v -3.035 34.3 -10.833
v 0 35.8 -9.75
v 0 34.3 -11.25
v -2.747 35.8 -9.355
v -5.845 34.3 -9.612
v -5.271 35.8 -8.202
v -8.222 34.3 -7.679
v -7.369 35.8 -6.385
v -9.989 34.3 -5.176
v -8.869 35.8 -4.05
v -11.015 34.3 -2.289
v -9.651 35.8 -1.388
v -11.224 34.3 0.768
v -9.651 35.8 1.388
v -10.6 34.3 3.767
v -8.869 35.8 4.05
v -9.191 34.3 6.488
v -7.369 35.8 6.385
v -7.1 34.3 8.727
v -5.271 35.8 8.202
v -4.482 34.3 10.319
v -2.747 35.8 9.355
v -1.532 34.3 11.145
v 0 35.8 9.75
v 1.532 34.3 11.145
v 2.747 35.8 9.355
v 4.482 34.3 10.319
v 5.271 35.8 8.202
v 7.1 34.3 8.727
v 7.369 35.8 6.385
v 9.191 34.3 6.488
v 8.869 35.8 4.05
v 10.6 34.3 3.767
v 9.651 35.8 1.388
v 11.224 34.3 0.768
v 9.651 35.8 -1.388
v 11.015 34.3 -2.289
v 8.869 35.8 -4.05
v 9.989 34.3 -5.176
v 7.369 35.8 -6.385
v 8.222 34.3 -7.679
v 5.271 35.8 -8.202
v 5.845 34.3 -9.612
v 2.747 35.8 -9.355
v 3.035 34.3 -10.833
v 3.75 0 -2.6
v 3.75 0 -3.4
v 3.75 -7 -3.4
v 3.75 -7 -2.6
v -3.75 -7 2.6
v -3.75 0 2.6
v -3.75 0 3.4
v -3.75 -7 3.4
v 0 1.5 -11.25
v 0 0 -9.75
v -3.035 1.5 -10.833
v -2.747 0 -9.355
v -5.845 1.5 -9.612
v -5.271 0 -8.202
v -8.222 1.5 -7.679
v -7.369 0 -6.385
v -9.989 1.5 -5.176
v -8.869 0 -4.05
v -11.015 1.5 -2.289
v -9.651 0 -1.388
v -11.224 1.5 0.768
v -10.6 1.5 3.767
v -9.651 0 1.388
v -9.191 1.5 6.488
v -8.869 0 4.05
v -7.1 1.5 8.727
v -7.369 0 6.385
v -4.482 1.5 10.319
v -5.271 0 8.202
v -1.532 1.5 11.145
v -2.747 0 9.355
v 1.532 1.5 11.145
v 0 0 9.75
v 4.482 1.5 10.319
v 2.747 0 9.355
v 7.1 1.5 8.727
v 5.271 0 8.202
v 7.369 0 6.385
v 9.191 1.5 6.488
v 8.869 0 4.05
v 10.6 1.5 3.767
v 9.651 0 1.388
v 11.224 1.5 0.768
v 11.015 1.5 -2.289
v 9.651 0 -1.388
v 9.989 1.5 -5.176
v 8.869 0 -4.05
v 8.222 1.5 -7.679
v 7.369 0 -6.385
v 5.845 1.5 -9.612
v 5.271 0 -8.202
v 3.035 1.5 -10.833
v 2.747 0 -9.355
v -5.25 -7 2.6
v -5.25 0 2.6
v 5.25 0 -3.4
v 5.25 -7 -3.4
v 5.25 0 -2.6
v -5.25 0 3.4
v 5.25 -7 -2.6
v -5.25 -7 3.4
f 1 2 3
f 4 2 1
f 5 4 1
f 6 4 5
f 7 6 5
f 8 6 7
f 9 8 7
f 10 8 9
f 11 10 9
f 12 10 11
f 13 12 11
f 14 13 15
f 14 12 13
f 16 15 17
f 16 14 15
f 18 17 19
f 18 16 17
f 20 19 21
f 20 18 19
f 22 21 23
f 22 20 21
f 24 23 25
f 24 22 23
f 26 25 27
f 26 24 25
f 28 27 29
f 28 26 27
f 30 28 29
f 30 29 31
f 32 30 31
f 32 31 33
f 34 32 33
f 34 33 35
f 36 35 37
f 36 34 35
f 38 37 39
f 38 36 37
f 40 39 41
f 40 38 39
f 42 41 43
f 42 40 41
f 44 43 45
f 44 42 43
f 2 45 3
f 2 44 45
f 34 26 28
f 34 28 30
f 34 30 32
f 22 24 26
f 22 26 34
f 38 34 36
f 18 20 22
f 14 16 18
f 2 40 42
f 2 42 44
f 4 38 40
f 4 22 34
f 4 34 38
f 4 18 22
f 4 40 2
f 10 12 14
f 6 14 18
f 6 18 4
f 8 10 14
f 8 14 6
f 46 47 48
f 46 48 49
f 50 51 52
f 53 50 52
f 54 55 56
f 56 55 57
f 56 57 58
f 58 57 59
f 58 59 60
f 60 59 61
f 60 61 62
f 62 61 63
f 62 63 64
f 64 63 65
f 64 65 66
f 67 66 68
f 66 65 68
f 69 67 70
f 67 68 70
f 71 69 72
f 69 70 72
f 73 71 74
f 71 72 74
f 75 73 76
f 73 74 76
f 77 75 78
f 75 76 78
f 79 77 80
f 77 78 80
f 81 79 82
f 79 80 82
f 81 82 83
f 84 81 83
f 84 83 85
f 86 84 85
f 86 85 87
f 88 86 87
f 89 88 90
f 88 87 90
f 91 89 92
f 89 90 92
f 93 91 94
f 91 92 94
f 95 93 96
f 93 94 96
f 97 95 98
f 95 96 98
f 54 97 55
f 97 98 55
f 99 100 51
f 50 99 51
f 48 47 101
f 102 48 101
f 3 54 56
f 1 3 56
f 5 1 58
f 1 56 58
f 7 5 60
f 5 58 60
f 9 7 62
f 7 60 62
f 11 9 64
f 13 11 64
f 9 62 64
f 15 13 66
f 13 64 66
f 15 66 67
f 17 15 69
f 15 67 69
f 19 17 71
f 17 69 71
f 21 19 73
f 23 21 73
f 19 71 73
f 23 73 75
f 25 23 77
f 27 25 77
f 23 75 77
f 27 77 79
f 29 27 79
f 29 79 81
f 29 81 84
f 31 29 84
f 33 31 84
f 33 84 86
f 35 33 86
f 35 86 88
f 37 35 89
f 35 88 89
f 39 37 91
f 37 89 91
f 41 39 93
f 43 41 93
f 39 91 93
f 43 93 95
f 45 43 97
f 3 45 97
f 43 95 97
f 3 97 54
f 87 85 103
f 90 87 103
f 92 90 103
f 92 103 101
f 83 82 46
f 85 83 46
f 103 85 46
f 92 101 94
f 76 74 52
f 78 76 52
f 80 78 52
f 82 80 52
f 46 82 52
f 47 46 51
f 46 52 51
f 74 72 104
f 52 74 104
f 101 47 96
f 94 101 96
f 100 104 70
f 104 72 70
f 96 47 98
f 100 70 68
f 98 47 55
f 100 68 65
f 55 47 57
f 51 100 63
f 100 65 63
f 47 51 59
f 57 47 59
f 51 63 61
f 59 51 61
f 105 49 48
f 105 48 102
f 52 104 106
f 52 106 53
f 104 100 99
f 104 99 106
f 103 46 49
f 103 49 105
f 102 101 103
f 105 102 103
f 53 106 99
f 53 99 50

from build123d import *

# Parameters (mm, degrees)
CROQUIS1_R              = 11.25
SALIENTE_EXTRUIR1_DEPTH = 35.8
CHAFL_N1_SIZE           = 1.5
CROQUIS3_W              = 1.5
CROQUIS3_H              = 0.8
SALIENTE_EXTRUIR2_DEPTH = 7


with BuildPart() as part:
    # Croquis1 → Saliente-Extruir1 (new body)
    with BuildSketch(Plane(origin=(0, 0, 0), x_dir=(1, 0, 0), z_dir=(0, 1, 0))):
        with Locations(Location((0, 0, 0), (0, 0, 90))):
            Circle(CROQUIS1_R)
    extrude(amount=SALIENTE_EXTRUIR1_DEPTH)

    # Chaflán1
    chafl_n1_edges = [part.edges().sort_by_distance(p)[0] for p in [
        (0, 0, 11.25),
        (0, 35.8, 11.25),
    ]]
    chamfer(chafl_n1_edges, length=CHAFL_N1_SIZE)

    # Croquis3 → Saliente-Extruir2 (add)
    with BuildSketch(Plane.XZ):
        with Locations((-4.5, 3)):
            Rectangle(CROQUIS3_W, CROQUIS3_H)
        with Locations((4.5, -3)):
            Rectangle(CROQUIS3_W, CROQUIS3_H)
    extrude(amount=SALIENTE_EXTRUIR2_DEPTH)


solid = part.part
